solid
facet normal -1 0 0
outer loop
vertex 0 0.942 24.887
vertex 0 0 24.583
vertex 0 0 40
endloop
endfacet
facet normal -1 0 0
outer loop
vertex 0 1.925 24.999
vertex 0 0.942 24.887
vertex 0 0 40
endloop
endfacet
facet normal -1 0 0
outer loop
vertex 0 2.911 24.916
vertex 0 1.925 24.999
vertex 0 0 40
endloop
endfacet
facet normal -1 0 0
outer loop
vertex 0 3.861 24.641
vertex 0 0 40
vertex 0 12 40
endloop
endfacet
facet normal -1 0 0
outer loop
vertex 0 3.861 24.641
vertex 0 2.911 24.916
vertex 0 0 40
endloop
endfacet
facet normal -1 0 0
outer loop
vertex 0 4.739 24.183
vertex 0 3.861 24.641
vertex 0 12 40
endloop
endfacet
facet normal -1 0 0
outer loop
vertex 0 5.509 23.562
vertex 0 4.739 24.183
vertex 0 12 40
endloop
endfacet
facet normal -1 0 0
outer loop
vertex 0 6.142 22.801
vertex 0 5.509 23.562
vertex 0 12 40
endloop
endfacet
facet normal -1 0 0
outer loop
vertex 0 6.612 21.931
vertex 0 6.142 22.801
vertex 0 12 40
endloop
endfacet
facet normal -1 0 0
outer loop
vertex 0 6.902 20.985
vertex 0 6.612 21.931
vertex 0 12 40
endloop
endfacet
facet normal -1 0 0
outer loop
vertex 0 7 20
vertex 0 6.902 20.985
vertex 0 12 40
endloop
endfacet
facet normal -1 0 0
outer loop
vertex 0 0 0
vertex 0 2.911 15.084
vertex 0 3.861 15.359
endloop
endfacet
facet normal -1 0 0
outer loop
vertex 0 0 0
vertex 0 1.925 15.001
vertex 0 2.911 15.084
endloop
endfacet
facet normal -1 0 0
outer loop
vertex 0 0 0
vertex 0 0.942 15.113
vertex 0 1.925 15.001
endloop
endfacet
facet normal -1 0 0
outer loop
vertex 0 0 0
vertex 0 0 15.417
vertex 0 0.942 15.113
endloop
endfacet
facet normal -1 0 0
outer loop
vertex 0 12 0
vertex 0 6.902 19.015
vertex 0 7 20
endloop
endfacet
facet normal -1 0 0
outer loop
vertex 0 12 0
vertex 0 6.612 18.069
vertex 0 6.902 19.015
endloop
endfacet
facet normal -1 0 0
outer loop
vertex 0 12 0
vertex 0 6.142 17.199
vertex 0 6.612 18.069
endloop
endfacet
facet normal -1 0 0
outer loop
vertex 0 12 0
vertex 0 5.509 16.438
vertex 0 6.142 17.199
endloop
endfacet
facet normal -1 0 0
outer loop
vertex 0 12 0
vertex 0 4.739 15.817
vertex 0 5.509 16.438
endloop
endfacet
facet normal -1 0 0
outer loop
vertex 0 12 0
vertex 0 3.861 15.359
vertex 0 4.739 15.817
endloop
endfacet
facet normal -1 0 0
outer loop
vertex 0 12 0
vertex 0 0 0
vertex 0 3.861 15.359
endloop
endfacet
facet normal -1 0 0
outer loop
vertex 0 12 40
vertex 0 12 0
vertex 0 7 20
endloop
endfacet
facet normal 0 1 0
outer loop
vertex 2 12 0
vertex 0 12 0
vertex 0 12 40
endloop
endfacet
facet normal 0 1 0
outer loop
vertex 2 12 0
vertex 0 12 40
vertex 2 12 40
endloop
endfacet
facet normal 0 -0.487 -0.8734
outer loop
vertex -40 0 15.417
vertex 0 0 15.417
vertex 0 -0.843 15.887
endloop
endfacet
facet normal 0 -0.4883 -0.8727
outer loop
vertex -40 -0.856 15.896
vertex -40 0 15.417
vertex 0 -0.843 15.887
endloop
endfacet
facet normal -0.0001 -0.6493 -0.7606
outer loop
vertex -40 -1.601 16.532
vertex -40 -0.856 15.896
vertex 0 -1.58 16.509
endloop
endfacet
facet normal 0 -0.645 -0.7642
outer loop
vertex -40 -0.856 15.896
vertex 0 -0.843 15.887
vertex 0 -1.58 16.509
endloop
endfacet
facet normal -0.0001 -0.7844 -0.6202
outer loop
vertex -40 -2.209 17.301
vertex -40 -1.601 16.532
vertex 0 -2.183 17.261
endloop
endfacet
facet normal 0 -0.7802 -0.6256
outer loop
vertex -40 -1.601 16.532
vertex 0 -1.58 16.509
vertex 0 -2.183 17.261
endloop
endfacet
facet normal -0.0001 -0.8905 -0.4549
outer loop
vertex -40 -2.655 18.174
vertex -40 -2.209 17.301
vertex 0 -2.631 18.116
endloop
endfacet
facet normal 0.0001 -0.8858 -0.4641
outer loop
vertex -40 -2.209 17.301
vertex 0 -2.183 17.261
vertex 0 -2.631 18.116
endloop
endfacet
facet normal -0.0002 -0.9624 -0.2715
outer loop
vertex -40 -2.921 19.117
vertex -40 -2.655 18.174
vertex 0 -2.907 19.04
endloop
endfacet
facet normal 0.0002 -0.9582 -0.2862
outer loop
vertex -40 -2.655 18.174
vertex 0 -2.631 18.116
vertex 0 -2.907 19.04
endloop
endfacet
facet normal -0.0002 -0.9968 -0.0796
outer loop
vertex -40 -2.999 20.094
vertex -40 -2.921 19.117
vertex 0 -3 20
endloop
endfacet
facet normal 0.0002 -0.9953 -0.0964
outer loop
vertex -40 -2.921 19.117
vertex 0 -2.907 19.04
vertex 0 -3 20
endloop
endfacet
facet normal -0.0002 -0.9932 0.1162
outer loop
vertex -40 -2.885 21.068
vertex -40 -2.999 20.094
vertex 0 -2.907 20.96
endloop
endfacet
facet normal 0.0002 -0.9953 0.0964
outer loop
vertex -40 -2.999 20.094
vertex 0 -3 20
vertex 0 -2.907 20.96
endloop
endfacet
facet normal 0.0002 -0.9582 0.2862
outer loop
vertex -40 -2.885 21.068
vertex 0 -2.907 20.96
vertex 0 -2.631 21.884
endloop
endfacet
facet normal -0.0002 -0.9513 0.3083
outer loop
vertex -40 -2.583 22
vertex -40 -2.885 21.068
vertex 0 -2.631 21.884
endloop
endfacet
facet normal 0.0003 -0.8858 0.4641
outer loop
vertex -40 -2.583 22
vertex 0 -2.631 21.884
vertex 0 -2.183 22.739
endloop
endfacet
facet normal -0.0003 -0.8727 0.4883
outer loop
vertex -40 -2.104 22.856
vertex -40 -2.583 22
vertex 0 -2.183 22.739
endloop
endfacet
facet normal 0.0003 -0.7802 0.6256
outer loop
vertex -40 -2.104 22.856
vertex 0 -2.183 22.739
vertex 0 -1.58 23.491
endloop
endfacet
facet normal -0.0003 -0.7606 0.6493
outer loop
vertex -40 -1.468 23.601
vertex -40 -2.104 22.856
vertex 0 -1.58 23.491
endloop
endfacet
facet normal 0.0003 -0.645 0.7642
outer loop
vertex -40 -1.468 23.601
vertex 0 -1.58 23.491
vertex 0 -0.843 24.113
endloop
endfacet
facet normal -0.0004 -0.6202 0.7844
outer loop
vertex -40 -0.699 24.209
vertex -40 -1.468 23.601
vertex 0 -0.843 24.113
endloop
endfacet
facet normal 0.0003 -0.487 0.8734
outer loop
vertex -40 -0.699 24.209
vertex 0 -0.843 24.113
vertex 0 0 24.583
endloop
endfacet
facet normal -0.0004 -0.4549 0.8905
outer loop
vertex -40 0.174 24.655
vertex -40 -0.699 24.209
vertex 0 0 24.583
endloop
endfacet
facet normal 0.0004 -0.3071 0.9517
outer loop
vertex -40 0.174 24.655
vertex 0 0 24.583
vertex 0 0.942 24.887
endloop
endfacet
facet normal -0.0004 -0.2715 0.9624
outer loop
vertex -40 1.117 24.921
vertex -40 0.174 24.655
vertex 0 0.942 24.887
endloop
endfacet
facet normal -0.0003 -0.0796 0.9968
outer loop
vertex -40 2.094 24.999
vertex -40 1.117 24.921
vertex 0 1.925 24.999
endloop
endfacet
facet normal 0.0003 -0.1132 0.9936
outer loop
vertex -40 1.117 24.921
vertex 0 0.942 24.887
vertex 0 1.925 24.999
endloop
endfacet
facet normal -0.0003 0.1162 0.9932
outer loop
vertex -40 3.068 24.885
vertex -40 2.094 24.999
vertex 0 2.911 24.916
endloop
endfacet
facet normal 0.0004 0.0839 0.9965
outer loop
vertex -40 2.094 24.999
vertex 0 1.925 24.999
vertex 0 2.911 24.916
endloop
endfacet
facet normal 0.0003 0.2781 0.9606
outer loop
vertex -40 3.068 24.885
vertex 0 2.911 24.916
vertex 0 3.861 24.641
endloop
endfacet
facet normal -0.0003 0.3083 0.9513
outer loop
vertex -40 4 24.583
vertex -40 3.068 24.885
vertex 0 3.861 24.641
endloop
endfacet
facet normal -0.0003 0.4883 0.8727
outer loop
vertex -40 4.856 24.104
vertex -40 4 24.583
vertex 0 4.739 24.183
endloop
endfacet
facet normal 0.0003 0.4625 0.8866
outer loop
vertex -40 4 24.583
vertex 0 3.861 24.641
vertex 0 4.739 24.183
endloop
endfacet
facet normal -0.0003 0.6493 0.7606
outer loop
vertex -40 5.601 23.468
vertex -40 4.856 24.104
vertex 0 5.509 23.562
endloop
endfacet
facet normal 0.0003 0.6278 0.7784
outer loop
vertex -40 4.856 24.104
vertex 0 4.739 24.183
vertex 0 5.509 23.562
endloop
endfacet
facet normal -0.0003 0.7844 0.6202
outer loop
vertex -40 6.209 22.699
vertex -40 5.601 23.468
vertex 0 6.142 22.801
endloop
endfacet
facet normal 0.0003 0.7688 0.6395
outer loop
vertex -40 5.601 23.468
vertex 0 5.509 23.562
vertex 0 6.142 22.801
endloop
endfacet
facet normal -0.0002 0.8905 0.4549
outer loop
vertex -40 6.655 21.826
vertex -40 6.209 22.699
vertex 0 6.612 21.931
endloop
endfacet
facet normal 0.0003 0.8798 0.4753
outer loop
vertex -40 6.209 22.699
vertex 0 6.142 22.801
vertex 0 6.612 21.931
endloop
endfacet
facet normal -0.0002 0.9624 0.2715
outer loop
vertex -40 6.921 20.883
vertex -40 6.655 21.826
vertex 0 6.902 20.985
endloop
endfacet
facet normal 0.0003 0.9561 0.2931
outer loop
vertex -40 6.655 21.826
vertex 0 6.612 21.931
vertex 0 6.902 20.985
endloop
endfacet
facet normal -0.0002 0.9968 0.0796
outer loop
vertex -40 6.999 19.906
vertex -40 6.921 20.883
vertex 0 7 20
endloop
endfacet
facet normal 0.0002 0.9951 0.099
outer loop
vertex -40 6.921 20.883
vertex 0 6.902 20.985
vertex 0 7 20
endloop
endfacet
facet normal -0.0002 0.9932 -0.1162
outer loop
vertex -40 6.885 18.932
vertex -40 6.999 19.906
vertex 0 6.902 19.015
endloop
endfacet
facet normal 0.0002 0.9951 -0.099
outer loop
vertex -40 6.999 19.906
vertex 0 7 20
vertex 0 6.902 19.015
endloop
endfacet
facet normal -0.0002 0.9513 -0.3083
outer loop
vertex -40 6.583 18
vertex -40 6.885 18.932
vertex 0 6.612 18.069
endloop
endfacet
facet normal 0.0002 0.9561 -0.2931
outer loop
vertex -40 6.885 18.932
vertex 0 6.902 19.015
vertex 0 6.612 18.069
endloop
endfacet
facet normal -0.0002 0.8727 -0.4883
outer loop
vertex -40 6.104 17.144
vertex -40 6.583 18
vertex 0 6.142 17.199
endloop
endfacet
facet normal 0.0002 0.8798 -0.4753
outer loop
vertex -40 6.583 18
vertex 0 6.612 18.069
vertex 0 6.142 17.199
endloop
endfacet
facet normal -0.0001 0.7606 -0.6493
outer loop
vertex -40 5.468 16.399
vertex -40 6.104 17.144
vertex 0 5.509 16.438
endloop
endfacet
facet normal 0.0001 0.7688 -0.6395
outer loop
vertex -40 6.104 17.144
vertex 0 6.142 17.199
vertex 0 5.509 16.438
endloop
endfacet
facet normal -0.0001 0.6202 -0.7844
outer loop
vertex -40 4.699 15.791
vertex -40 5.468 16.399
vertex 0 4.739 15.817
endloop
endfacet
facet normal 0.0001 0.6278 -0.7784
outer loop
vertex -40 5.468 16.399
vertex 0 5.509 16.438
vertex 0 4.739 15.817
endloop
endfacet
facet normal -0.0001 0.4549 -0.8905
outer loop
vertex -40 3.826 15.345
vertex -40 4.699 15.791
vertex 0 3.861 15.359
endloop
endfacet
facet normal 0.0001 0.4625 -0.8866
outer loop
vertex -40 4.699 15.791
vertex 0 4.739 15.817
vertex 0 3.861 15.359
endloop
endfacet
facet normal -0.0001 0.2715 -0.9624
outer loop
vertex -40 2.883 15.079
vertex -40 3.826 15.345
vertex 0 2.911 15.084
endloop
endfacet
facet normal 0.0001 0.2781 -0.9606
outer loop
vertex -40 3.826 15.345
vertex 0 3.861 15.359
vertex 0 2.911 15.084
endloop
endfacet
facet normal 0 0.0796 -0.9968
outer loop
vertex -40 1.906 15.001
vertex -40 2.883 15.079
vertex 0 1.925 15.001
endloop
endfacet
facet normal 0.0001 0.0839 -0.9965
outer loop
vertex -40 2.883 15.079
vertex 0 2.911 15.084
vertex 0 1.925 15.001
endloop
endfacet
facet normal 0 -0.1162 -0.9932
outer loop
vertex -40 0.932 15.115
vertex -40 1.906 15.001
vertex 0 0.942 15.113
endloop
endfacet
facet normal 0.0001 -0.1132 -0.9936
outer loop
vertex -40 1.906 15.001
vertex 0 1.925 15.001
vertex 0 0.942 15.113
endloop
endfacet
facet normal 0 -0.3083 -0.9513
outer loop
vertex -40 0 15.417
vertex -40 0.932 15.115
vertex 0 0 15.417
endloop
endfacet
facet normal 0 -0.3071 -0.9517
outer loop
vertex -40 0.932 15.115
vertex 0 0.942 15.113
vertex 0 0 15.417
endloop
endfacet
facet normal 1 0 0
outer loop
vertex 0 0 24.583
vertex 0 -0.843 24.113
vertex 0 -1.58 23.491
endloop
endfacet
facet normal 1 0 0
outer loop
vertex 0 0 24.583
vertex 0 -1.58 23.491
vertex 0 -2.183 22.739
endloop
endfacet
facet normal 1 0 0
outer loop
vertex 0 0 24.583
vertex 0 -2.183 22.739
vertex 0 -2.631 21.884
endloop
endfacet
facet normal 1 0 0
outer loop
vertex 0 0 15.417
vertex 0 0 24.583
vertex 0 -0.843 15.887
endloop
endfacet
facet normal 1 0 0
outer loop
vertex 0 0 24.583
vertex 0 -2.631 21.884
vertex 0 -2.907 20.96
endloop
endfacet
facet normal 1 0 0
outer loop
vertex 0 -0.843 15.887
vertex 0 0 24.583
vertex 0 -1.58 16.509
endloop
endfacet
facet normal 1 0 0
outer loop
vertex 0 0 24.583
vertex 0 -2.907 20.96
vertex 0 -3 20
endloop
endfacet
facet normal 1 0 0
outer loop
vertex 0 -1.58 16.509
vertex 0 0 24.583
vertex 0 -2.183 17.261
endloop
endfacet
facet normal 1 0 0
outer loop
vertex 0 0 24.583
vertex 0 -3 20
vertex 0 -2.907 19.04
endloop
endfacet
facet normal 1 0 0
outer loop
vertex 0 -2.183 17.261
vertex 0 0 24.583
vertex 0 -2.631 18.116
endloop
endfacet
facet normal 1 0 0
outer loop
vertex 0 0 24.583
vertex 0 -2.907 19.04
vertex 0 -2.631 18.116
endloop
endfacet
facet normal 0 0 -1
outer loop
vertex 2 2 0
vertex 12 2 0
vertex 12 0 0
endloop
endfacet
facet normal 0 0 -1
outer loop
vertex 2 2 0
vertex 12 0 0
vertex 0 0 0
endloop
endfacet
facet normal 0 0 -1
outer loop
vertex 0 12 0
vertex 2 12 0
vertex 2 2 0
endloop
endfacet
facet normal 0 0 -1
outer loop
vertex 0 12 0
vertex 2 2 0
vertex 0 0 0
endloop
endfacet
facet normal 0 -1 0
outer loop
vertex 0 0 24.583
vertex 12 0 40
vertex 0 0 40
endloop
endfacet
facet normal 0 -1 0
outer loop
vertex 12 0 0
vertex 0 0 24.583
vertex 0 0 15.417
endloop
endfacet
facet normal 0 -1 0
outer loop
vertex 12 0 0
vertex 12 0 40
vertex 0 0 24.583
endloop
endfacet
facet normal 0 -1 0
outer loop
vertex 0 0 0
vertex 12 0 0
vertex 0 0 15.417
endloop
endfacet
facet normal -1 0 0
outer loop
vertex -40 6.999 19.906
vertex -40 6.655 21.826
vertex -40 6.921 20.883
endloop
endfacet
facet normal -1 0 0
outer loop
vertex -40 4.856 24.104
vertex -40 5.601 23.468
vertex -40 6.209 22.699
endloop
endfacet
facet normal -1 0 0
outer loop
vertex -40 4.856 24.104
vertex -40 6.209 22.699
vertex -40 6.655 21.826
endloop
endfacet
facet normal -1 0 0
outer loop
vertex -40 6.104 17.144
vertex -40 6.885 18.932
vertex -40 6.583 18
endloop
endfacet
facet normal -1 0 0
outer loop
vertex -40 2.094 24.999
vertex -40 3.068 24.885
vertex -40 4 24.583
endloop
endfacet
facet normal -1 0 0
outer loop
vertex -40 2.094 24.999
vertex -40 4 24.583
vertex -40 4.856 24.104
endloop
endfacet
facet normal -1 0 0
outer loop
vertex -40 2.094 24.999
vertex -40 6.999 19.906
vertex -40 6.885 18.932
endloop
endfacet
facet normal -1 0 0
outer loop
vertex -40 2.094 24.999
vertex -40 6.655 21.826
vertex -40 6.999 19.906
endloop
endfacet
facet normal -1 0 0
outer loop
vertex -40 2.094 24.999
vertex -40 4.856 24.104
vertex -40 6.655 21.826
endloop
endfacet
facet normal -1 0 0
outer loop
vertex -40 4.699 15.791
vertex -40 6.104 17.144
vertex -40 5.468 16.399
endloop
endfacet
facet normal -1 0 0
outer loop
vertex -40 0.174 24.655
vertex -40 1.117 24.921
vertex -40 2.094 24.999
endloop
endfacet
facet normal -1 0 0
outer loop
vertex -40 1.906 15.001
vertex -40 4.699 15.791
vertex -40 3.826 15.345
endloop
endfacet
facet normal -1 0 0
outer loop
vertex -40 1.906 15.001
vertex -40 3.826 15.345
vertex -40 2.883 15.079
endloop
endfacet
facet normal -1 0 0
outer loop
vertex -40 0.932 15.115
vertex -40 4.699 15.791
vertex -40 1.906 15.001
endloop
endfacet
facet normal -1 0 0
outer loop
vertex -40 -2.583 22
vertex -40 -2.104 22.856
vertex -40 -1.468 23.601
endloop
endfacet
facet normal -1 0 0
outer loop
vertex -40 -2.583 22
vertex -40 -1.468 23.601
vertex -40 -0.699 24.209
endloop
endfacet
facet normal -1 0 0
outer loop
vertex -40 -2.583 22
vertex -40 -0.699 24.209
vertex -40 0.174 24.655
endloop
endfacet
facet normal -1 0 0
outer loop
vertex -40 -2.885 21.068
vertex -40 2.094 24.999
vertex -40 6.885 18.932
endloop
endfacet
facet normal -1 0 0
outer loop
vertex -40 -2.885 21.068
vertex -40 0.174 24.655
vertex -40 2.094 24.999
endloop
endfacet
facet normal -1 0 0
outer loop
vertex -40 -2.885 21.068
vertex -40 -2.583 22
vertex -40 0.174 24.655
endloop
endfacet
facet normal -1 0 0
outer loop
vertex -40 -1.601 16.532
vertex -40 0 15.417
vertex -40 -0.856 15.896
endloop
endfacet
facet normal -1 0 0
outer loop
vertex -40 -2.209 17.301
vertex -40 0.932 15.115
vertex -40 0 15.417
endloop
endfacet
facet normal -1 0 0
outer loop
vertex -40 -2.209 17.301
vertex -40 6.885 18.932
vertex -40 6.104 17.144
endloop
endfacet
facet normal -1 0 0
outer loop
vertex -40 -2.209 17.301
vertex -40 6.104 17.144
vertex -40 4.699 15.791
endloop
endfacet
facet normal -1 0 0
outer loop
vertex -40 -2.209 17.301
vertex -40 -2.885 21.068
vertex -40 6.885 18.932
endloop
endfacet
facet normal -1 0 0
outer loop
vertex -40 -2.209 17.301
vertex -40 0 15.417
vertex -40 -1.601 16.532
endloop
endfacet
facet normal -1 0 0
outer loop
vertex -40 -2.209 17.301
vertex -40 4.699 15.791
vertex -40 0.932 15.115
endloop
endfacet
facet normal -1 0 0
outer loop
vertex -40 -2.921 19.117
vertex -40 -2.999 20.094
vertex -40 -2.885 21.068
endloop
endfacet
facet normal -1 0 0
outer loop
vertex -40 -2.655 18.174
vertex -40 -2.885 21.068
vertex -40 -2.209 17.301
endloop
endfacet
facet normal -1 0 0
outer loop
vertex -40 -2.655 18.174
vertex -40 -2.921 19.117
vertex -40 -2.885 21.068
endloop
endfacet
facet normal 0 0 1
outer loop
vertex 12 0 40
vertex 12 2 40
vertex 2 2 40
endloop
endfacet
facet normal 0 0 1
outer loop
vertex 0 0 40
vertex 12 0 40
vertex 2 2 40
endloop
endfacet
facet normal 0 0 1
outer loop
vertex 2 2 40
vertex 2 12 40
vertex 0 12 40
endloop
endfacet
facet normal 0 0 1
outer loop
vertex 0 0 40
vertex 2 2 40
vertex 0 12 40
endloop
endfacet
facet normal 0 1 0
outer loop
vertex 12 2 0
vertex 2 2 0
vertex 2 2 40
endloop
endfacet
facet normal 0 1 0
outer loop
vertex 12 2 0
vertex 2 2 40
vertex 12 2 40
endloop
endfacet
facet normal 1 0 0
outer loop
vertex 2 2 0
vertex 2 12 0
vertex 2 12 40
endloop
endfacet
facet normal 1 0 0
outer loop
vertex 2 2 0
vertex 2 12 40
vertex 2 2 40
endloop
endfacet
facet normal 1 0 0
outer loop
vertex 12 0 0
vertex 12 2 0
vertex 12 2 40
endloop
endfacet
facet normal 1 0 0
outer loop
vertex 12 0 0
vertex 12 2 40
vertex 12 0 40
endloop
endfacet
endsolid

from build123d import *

# Parameters (mm, degrees)
BOSS_EXTRU_1_DEPTH = 40
ESQUISSE2_R        = 5
BOSS_EXTRU_2_DEPTH = 40


with BuildPart() as part:
    # Esquisse1 → Boss.-Extru.1 (new body)
    with BuildSketch(Plane.XY):
        Polygon((0, 0), (0, 12), (2, 12), (2, 2), (12, 2), (12, 0), align=None)
    extrude(amount=BOSS_EXTRU_1_DEPTH)

    # Esquisse2 → Boss.-Extru.2 (add)
    with BuildSketch(Plane.ZY):
        with Locations(Location((20, 2, 0), (0, 0, 203.578178478))):
            Circle(ESQUISSE2_R)
    extrude(amount=BOSS_EXTRU_2_DEPTH)


solid = part.part
